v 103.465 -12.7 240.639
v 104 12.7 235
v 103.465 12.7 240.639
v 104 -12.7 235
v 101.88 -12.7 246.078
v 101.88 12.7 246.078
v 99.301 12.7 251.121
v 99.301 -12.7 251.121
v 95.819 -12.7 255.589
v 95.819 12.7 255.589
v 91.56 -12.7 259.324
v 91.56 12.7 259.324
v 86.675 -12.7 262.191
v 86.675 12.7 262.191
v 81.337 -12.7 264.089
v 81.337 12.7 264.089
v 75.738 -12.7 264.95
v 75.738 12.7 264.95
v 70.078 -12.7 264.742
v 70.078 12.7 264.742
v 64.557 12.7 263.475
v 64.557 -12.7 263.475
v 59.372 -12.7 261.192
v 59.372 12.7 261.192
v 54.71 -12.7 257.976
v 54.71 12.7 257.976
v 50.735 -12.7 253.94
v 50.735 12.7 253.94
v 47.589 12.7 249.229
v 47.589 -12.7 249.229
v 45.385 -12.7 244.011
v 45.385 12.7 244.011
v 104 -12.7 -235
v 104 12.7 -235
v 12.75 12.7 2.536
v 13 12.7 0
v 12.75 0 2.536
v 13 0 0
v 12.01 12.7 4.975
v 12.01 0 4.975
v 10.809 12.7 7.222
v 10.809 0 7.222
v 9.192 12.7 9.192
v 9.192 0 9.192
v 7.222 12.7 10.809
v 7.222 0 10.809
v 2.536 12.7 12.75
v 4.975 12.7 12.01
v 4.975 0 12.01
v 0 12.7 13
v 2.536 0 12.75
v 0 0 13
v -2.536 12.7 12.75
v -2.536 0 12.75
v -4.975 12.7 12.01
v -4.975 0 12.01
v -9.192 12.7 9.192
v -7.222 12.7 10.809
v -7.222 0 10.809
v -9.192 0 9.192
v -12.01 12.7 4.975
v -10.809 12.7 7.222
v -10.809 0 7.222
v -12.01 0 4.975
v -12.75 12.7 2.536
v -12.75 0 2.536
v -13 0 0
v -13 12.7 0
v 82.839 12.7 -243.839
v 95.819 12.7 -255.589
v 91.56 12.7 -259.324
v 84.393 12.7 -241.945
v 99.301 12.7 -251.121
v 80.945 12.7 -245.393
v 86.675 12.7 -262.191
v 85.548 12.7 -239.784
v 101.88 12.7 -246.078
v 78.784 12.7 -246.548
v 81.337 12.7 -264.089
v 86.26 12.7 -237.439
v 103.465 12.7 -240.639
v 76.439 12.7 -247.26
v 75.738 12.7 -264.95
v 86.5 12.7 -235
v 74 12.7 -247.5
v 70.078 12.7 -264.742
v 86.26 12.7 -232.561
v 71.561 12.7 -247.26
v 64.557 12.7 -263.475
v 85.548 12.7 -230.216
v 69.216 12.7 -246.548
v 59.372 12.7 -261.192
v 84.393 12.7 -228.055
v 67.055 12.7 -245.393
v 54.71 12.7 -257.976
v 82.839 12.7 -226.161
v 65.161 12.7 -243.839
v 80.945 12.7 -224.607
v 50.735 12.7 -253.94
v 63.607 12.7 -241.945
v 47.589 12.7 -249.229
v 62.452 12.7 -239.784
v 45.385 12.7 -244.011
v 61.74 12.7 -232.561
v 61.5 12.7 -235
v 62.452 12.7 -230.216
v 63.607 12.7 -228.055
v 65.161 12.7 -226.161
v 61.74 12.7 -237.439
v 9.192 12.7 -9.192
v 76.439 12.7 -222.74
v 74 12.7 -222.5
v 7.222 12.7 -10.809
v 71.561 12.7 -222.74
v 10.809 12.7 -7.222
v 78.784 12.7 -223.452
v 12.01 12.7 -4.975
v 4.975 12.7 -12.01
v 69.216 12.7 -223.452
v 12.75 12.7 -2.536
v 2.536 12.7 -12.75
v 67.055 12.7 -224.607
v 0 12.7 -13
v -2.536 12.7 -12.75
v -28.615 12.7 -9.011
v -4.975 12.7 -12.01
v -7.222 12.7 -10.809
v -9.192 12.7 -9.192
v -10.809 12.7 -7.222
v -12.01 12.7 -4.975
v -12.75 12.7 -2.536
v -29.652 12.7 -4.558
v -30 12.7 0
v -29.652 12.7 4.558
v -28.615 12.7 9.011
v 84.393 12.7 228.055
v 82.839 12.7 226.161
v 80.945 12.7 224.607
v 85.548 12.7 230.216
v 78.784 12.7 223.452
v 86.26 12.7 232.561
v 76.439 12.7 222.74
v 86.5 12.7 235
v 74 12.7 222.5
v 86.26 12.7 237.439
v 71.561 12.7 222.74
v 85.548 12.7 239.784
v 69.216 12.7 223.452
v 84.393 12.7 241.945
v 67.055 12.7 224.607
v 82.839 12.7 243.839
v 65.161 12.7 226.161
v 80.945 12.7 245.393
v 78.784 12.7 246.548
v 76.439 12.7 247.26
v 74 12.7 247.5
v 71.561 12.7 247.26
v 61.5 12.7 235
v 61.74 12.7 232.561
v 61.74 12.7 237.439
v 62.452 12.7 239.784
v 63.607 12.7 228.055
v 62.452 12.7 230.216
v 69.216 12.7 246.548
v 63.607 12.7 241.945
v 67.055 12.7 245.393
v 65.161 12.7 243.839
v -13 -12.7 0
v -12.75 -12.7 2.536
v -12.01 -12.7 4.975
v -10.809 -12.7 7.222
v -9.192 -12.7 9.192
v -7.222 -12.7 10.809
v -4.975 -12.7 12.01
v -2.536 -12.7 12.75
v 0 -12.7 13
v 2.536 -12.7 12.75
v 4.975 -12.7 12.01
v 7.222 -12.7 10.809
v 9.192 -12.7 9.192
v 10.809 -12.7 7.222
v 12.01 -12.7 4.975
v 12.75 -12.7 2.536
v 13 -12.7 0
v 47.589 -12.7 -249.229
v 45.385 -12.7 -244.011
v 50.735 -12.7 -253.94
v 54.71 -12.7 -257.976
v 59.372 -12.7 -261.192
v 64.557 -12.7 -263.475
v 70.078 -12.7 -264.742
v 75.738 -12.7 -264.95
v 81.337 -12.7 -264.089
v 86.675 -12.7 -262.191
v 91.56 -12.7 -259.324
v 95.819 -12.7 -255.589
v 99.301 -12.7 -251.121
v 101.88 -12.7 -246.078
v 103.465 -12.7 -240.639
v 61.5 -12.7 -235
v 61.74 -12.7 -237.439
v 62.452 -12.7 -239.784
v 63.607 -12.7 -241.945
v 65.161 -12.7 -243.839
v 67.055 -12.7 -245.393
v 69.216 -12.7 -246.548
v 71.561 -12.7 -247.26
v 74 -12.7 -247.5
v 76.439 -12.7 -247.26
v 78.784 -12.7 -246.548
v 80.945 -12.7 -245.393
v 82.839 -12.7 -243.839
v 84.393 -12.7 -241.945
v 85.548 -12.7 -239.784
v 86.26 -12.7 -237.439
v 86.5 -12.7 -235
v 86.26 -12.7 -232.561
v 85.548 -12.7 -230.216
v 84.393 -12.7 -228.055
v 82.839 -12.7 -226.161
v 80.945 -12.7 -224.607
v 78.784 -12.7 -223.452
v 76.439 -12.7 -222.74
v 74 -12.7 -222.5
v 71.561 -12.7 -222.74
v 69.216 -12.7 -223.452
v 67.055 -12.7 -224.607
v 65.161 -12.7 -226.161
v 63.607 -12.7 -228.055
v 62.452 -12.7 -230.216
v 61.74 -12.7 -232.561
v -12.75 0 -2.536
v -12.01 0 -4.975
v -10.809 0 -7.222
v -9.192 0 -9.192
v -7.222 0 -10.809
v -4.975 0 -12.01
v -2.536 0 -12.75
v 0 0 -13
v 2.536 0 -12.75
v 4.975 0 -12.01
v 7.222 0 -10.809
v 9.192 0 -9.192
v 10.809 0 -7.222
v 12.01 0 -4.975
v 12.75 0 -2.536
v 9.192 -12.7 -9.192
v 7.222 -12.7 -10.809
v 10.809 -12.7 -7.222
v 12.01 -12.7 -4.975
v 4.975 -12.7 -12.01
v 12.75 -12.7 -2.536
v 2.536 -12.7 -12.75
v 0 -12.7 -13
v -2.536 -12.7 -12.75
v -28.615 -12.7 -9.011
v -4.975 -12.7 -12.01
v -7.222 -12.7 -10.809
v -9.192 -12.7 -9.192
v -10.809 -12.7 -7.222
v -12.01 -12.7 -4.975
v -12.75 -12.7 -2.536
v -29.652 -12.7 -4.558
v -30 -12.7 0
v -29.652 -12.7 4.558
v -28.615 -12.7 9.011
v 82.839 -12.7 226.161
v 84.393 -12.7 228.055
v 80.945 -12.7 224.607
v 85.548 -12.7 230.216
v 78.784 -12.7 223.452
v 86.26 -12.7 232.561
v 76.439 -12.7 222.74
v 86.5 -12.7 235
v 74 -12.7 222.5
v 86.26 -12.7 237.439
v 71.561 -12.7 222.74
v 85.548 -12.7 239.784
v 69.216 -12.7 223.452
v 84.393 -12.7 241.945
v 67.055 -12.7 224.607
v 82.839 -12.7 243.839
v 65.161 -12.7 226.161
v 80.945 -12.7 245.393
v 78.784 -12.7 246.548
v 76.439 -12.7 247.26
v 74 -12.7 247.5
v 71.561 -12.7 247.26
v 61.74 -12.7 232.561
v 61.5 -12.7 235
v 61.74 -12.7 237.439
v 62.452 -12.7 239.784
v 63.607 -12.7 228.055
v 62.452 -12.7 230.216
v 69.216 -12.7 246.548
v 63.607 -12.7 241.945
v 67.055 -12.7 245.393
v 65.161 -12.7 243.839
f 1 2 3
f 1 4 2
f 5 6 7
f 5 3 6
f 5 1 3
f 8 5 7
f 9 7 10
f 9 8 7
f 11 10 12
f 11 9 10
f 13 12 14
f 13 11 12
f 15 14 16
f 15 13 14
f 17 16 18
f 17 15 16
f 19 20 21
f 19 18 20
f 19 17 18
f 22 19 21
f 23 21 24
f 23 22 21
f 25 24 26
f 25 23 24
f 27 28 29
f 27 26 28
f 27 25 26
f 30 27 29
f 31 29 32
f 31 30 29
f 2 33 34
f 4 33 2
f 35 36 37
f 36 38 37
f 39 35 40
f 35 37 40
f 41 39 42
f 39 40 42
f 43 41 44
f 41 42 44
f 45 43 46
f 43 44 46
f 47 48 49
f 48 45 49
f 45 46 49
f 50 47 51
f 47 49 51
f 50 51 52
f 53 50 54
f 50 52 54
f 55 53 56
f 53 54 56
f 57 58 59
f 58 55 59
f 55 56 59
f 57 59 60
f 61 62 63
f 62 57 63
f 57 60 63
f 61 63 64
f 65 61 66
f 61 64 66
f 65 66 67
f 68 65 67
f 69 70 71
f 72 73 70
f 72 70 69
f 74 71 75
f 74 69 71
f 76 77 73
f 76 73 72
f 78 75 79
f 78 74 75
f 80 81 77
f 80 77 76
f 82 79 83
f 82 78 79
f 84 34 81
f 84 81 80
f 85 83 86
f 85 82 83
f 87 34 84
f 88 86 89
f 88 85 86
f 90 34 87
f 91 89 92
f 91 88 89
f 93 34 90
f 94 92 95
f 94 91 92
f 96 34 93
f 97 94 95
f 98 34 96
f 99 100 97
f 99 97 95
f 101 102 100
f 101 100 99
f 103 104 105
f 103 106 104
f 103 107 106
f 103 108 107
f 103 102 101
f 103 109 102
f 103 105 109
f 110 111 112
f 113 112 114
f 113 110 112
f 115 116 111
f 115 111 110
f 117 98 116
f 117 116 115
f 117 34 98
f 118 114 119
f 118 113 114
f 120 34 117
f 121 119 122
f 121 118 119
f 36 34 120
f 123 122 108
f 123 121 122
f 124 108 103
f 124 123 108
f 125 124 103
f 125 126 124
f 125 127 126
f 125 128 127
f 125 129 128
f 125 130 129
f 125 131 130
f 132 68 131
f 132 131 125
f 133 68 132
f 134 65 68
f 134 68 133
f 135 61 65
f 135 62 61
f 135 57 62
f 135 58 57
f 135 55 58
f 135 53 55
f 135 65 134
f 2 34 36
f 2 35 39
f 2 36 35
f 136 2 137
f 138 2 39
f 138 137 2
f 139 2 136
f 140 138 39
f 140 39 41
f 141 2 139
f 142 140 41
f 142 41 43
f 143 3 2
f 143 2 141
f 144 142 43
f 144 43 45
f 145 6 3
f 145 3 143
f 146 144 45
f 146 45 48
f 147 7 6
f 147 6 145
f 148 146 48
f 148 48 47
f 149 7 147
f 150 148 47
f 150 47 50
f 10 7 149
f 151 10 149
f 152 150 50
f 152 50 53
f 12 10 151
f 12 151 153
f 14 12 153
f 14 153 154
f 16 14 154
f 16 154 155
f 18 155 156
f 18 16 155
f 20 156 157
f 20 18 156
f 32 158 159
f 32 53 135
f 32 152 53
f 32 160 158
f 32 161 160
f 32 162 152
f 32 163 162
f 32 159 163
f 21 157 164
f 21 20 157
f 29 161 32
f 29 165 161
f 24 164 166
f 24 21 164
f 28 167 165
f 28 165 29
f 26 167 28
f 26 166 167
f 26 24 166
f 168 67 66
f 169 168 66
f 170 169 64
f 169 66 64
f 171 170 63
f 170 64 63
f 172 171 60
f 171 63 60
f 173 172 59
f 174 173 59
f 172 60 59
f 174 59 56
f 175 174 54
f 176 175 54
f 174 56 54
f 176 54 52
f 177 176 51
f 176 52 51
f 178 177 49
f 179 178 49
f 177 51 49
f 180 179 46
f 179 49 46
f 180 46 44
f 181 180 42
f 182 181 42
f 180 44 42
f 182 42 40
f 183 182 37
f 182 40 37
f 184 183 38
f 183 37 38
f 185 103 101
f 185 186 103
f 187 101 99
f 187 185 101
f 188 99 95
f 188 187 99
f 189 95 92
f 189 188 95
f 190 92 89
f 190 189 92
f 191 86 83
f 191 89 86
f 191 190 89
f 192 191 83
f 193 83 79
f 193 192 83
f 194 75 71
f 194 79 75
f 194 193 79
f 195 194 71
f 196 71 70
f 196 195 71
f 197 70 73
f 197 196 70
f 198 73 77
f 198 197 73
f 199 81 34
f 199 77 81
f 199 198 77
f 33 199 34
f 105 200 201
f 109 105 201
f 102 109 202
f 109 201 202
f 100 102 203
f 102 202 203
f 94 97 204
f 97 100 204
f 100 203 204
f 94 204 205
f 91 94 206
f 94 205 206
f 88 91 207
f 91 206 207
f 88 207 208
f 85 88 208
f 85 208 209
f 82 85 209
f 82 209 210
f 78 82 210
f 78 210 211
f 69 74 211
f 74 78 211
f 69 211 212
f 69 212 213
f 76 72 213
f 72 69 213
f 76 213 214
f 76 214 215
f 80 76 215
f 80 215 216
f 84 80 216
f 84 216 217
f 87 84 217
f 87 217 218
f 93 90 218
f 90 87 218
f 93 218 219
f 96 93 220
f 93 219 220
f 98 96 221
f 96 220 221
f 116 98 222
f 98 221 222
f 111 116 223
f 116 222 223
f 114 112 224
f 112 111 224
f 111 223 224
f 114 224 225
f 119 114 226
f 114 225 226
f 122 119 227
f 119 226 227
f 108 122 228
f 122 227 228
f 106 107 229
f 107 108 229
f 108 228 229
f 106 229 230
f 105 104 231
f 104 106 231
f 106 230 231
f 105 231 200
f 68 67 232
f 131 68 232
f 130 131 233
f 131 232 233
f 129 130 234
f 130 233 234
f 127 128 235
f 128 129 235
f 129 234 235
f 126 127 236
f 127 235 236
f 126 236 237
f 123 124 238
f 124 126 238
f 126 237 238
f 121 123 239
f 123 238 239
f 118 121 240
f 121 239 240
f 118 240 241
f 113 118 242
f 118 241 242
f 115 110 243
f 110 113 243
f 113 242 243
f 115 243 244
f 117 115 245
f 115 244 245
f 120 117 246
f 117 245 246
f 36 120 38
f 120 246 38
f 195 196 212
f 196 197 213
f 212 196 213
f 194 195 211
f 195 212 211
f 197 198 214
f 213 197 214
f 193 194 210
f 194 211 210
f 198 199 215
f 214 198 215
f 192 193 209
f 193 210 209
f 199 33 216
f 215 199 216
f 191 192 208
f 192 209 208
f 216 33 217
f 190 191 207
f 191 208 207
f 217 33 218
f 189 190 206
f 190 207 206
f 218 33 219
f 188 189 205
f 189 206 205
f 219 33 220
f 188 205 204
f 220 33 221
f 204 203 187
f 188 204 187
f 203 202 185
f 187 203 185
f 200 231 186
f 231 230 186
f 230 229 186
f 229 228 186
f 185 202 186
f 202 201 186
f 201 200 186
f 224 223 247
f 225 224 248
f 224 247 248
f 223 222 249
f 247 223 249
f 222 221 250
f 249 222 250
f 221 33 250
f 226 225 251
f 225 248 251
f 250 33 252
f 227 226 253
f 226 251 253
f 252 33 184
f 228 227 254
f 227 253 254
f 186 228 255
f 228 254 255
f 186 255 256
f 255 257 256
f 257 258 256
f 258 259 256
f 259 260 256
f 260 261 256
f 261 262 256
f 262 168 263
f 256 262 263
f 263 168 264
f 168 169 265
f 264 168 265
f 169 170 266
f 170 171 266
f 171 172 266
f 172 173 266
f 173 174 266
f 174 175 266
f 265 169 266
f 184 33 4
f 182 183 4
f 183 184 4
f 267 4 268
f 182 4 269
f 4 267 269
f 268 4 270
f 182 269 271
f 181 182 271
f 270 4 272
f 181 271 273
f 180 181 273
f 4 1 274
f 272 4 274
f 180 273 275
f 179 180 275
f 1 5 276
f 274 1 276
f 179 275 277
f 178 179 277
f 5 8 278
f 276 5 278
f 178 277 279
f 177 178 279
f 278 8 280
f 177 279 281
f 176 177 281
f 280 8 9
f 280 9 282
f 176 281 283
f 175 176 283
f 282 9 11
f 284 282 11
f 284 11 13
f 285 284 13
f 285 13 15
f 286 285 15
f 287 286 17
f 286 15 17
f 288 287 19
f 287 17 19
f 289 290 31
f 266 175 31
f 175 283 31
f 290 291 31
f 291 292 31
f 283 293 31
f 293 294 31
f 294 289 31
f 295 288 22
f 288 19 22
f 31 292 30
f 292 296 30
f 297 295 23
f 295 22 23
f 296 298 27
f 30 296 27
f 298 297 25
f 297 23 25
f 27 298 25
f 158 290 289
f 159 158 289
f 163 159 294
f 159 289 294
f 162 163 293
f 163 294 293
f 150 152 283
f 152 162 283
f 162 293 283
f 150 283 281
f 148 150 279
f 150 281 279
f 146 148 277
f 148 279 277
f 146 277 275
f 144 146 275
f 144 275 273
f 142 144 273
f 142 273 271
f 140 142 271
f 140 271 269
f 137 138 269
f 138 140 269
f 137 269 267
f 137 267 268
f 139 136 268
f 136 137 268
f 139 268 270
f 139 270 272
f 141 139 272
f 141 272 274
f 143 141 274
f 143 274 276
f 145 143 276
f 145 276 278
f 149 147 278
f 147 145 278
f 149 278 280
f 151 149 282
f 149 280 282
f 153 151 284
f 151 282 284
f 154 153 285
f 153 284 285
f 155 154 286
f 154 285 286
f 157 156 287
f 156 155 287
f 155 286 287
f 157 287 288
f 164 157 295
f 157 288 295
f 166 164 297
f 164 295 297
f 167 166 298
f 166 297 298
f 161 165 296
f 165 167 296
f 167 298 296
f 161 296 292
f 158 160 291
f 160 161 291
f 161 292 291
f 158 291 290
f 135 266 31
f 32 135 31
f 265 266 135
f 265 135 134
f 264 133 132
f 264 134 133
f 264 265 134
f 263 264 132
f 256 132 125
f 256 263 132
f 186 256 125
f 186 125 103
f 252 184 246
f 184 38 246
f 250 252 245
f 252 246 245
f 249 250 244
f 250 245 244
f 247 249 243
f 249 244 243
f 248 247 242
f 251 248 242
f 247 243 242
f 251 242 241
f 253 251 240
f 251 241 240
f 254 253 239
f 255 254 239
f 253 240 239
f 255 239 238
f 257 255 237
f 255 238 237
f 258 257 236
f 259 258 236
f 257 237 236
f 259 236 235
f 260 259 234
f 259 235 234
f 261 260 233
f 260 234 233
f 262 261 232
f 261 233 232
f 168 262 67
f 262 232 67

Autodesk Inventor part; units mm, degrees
ref_plane "YZ Plane" through (0, 0, 0) normal (1, 0, 0) x (0, 1, 0)
ref_plane "XZ Plane" through (0, 0, 0) normal (0, 1, 0) x (-1, 0, 0)
ref_plane "XY Plane" through (0, 0, 0) normal (0, 0, 1) x (1, 0, 0)
sketch "Sketch1" plane through (0, 0, 0) normal (0, 1, 0) x (-1, 0, 0)
  circle A0 centre (0, 0) radius 13
  line L0 (28.6148, 9.0106) -> (-45.3852, 244.0106)
  line L1 (-104, 235) -> (-104, 75.4136)
  circle A1 centre (-74, 235) radius 12.5
  circle A2 centre (-74, 0) radius 12.5 construction
  line L2 (0, 0) -> (-74, 0)
  line L3 (28.6148, -9.0106) -> (-45.3852, -244.0106)
  line L4 (-104, -235) -> (-104, 75.4136)
  circle A3 centre (-74, -235) radius 12.5
  arc A4 (-45.3852, 244.0106) -> (-104, 235) centre (-74, 235) ccw
  arc A5 (28.6148, -9.0106) -> (28.6148, 9.0106) centre (0, 0) ccw
  arc A6 (-104, -235) -> (-45.3852, -244.0106) centre (-74, -235) ccw
  point P0 (-104, 430.1523)
  point P1 (-104, -430.1523)
  dimension "d0" = 26
  dimension "d1" = 25
  dimension "d2" = 25
  dimension "d4" = 74
  dimension "d6" = 470
  dimension "d9" = 30
  dimension "d10" = 30
extrude "Extrusion1" add sketch "Sketch1" along normal mid plane 25.4
properties part number "Espacador_Delta"
